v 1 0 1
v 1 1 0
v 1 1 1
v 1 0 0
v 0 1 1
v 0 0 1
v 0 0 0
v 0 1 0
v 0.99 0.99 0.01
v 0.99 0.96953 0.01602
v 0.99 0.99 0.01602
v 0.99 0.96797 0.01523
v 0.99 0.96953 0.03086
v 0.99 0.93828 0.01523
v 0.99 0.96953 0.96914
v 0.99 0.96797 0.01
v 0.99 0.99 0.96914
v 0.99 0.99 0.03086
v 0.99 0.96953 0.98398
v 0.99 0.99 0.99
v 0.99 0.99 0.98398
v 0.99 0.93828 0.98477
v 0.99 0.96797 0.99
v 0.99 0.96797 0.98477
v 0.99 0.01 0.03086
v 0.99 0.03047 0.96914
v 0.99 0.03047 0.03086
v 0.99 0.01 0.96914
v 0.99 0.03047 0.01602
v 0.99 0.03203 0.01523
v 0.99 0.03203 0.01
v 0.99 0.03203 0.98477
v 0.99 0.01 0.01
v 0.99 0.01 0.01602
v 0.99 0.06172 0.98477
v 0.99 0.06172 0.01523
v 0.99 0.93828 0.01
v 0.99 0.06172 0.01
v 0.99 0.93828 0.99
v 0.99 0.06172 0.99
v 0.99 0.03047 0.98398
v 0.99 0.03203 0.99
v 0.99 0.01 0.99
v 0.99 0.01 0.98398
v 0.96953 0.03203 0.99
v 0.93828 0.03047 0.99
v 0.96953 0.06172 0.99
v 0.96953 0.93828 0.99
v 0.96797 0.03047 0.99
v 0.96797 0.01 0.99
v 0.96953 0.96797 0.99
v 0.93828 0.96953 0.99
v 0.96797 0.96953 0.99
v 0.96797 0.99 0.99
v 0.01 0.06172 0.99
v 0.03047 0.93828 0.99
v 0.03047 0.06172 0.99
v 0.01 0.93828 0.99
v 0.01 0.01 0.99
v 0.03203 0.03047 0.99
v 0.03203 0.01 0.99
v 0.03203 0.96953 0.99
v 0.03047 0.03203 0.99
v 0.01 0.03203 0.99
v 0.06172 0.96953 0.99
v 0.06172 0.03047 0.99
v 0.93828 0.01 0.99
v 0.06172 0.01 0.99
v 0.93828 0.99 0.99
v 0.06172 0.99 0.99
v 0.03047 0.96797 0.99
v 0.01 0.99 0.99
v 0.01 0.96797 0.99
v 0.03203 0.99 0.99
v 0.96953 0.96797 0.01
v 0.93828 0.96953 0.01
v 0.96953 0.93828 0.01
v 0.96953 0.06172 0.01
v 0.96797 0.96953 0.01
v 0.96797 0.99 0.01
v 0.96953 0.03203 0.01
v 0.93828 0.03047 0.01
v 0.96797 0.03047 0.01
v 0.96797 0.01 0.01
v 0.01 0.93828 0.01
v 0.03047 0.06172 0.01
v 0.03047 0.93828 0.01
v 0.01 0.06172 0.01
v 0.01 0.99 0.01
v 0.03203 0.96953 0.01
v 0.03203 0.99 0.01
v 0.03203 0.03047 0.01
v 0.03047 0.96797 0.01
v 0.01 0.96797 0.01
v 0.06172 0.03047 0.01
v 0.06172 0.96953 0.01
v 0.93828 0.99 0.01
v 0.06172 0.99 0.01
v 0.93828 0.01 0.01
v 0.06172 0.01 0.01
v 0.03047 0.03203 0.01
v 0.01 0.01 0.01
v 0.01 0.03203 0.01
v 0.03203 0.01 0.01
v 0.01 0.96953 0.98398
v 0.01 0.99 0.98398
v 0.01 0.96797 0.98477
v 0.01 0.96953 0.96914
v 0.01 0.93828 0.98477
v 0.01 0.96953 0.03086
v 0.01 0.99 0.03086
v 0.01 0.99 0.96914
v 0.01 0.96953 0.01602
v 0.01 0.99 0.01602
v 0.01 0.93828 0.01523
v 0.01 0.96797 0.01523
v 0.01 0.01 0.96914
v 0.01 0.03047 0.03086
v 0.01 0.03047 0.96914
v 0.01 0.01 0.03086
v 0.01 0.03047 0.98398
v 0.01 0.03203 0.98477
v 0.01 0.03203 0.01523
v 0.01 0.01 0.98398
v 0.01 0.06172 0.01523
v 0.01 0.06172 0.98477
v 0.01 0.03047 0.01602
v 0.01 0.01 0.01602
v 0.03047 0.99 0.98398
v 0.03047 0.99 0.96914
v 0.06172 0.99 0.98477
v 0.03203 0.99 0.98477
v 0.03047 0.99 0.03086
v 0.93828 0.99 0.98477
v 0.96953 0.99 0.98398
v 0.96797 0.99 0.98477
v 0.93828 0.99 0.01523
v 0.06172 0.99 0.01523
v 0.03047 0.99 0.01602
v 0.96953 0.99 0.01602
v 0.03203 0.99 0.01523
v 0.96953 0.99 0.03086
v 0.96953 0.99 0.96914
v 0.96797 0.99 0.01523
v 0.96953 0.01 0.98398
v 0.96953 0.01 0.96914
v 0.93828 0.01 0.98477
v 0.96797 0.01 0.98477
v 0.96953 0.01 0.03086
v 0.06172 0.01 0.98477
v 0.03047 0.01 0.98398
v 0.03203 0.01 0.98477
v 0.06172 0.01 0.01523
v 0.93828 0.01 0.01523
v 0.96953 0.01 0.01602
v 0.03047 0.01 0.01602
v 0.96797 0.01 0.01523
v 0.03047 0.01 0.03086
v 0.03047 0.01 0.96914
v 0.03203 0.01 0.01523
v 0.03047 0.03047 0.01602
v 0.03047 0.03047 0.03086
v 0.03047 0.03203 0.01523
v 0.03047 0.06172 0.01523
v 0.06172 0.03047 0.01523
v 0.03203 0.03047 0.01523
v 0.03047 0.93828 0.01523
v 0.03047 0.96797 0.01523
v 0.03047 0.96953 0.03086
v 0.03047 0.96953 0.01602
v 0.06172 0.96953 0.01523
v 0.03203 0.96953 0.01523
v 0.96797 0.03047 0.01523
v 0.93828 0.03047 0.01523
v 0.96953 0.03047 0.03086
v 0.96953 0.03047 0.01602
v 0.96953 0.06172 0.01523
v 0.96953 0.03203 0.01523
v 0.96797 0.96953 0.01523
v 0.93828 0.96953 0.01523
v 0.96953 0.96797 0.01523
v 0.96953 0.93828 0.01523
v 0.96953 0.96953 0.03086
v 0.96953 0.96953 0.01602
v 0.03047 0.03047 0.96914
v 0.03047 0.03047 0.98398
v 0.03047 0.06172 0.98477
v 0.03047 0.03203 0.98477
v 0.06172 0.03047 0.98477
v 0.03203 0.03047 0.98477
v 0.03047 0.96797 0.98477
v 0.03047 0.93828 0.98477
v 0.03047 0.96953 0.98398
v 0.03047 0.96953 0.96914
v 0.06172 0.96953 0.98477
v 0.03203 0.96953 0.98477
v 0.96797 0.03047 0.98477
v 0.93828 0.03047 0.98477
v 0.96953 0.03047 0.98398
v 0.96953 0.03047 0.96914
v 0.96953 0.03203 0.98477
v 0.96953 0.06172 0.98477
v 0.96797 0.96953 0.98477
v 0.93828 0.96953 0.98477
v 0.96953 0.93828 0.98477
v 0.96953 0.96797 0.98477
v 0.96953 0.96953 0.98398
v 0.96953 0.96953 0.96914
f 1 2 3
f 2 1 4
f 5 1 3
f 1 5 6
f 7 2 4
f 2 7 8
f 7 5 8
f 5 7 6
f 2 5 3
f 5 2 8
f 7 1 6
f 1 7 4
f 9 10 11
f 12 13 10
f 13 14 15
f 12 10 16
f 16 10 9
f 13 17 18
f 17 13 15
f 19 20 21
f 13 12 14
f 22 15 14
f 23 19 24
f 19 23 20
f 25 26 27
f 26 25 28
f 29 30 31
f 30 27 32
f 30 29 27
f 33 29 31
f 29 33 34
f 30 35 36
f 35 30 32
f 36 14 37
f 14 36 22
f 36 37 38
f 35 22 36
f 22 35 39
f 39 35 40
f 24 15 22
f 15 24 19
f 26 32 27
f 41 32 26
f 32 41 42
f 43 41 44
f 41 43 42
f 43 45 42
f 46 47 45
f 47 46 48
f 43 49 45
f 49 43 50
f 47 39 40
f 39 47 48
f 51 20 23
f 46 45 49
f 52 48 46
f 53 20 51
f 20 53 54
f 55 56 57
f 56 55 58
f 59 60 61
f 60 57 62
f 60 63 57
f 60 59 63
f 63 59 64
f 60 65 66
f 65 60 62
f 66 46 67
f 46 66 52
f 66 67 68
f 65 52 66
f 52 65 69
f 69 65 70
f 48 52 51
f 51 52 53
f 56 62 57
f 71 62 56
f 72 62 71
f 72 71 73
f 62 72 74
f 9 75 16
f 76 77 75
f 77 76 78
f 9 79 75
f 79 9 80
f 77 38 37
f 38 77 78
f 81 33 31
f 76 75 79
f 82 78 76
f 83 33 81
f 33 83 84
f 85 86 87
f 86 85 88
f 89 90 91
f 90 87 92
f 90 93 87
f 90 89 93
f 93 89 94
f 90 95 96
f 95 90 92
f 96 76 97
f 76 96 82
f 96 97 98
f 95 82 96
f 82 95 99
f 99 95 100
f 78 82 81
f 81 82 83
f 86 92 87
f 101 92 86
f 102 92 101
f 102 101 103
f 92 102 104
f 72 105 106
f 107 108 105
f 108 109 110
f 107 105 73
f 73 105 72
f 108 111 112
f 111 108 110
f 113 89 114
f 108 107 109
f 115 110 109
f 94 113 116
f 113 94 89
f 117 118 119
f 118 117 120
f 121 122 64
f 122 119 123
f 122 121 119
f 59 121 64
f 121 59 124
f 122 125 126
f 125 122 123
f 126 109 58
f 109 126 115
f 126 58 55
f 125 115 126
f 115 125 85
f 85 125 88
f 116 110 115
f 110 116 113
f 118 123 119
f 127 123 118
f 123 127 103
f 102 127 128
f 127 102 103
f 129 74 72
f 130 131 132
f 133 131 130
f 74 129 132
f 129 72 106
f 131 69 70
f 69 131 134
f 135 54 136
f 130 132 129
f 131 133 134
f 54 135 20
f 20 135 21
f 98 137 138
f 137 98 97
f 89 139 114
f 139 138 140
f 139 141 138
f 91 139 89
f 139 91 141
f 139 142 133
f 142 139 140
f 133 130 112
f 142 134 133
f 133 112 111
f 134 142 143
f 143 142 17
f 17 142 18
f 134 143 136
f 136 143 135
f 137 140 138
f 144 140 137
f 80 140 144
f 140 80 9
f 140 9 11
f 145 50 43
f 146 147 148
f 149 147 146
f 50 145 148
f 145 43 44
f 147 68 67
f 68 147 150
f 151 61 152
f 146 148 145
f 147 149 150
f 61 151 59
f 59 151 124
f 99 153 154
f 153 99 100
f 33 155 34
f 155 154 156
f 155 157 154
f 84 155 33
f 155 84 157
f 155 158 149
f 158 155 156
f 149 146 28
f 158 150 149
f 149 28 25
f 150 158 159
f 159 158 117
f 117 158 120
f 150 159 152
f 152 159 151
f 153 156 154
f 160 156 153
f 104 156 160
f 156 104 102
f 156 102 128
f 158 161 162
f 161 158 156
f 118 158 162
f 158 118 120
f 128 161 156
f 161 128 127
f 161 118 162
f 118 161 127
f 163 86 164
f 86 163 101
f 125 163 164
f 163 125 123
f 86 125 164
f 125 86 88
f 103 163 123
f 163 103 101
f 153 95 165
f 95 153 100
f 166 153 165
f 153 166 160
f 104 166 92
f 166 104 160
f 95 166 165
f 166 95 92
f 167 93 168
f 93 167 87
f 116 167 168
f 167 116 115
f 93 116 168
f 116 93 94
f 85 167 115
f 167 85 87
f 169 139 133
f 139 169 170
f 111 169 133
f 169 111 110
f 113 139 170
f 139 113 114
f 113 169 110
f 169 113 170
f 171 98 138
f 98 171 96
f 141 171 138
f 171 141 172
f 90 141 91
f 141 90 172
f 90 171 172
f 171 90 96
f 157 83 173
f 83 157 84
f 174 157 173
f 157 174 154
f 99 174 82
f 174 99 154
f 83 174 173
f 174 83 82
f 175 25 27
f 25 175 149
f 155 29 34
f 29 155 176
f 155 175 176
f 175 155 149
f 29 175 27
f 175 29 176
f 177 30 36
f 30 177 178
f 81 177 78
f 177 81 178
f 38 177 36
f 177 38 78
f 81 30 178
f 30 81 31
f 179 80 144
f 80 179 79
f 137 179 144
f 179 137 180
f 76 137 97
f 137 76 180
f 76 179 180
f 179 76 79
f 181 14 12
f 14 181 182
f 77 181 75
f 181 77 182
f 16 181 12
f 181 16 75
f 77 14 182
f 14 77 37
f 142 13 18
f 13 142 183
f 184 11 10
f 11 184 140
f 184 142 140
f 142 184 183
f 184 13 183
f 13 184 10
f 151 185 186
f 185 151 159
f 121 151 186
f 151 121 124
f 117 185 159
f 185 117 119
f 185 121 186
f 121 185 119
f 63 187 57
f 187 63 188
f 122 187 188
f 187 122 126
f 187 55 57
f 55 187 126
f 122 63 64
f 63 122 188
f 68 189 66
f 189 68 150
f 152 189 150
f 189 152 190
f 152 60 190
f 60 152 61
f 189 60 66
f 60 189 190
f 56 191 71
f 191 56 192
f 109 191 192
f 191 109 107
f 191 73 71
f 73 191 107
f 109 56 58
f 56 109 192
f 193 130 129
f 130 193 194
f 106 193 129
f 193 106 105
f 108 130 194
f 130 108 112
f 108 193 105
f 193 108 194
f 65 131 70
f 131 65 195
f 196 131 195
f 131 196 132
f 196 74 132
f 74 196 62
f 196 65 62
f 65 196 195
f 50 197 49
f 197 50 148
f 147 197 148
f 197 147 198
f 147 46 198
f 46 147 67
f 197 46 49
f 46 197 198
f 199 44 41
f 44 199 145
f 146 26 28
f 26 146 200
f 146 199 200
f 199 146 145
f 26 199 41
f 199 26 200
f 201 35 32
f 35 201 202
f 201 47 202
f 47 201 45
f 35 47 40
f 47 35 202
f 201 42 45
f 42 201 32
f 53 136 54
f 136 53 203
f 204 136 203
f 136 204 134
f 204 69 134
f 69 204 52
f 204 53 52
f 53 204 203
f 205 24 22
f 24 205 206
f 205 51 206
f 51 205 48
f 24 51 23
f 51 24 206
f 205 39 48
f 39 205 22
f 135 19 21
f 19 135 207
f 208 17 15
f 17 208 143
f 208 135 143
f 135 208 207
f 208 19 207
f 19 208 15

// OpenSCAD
translate([0.015625, 0.015625, 0.0234375]) color([0.3388593335787915, 0.8372642277909276, 0.3624415377760226]) cube([0.0296875, 0.0296875, 0.01484375], center=true);
translate([0.015625, 0.046875, 0.0078125]) color([0.9506098367229612, 0.35574375139565306, 0.7804160128228347]) cube([0.0296875, 0.0296875, 0.01484375], center=true);
translate([0.046875, 0.015625, 0.0078125]) color([0.112621725033477, 0.6164056262086993, 0.13772272969836896]) cube([0.0296875, 0.0296875, 0.01484375], center=true);
translate([0.015625, 0.953125, 0.0078125]) color([0.7403499144092284, 0.7925950072542015, 0.24078641315712368]) cube([0.0296875, 0.0296875, 0.01484375], center=true);
translate([0.015625, 0.984375, 0.0234375]) color([0.5330879040910398, 0.43230456697067465, 0.48863274244731103]) cube([0.0296875, 0.0296875, 0.01484375], center=true);
translate([0.046875, 0.984375, 0.0078125]) color([0.13672377925533274, 0.9757957776122126, 0.804909894046999]) cube([0.0296875, 0.0296875, 0.01484375], center=true);
translate([0.953125, 0.015625, 0.0078125]) color([0.8243533103951708, 0.8151547927198911, 0.4757267229724992]) cube([0.0296875, 0.0296875, 0.01484375], center=true);
translate([0.984375, 0.015625, 0.0234375]) color([0.655253853878747, 0.46183140841097103, 0.34263257745059805]) cube([0.0296875, 0.0296875, 0.01484375], center=true);
translate([0.984375, 0.046875, 0.0078125]) color([0.277015322554947, 0.15983461869810367, 0.45469336399596993]) cube([0.0296875, 0.0296875, 0.01484375], center=true);
translate([0.953125, 0.984375, 0.0078125]) color([0.25127734034272453, 0.1697436649616053, 0.06644698596187426]) cube([0.0296875, 0.0296875, 0.01484375], center=true);
translate([0.984375, 0.953125, 0.0078125]) color([0.24230120096010344, 0.8435938016714191, 0.9334877135326811]) cube([0.0296875, 0.0296875, 0.01484375], center=true);
translate([0.984375, 0.984375, 0.0234375]) color([0.1148921560070606, 0.9183668831149836, 0.48051277210696786]) cube([0.0296875, 0.0296875, 0.01484375], center=true);
translate([0.015625, 0.015625, 0.9765625]) color([0.9727138664032462, 0.8375514461540945, 0.21641863228025882]) cube([0.0296875, 0.0296875, 0.01484375], center=true);
translate([0.015625, 0.046875, 0.9921875]) color([0.9425880287305982, 0.2765747133964578, 0.6041196341781521]) cube([0.0296875, 0.0296875, 0.01484375], center=true);
translate([0.046875, 0.015625, 0.9921875]) color([0.18012249915887624, 0.3621917044998697, 0.5982040133396156]) cube([0.0296875, 0.0296875, 0.01484375], center=true);
translate([0.015625, 0.953125, 0.9921875]) color([0.551023848887376, 0.5939712590161424, 0.44567967260428376]) cube([0.0296875, 0.0296875, 0.01484375], center=true);
translate([0.015625, 0.984375, 0.9765625]) color([0.7279048191912264, 0.24963771851690686, 0.6692541811417259]) cube([0.0296875, 0.0296875, 0.01484375], center=true);
translate([0.046875, 0.984375, 0.9921875]) color([0.11473237901389177, 0.5454624111175664, 0.2871188182019968]) cube([0.0296875, 0.0296875, 0.01484375], center=true);
translate([0.953125, 0.015625, 0.9921875]) color([0.5650904916820142, 0.31608843200813797, 0.6853976531917014]) cube([0.0296875, 0.0296875, 0.01484375], center=true);
translate([0.984375, 0.015625, 0.9765625]) color([0.8537689602211658, 0.5709645831535891, 0.1824688651408376]) cube([0.0296875, 0.0296875, 0.01484375], center=true);
translate([0.984375, 0.046875, 0.9921875]) color([0.5304762867047613, 0.4598690504653322, 0.5963703220353002]) cube([0.0296875, 0.0296875, 0.01484375], center=true);
translate([0.953125, 0.984375, 0.9921875]) color([0.9658502236102725, 0.5991584184428466, 0.9626357592448023]) cube([0.0296875, 0.0296875, 0.01484375], center=true);
translate([0.984375, 0.953125, 0.9921875]) color([0.7750691041463794, 0.7349137041377853, 0.4888250218798852]) cube([0.0296875, 0.0296875, 0.01484375], center=true);
translate([0.984375, 0.984375, 0.9765625]) color([0.6815496291358387, 0.5358101975212045, 0.45286465443149404]) cube([0.0296875, 0.0296875, 0.01484375], center=true);
color([0.3,0.3,0.3,0.3]) difference() { cube([1,1,1]); translate([0.01,0.01,0.01]) cube([0.98,0.98,0.98]); }
